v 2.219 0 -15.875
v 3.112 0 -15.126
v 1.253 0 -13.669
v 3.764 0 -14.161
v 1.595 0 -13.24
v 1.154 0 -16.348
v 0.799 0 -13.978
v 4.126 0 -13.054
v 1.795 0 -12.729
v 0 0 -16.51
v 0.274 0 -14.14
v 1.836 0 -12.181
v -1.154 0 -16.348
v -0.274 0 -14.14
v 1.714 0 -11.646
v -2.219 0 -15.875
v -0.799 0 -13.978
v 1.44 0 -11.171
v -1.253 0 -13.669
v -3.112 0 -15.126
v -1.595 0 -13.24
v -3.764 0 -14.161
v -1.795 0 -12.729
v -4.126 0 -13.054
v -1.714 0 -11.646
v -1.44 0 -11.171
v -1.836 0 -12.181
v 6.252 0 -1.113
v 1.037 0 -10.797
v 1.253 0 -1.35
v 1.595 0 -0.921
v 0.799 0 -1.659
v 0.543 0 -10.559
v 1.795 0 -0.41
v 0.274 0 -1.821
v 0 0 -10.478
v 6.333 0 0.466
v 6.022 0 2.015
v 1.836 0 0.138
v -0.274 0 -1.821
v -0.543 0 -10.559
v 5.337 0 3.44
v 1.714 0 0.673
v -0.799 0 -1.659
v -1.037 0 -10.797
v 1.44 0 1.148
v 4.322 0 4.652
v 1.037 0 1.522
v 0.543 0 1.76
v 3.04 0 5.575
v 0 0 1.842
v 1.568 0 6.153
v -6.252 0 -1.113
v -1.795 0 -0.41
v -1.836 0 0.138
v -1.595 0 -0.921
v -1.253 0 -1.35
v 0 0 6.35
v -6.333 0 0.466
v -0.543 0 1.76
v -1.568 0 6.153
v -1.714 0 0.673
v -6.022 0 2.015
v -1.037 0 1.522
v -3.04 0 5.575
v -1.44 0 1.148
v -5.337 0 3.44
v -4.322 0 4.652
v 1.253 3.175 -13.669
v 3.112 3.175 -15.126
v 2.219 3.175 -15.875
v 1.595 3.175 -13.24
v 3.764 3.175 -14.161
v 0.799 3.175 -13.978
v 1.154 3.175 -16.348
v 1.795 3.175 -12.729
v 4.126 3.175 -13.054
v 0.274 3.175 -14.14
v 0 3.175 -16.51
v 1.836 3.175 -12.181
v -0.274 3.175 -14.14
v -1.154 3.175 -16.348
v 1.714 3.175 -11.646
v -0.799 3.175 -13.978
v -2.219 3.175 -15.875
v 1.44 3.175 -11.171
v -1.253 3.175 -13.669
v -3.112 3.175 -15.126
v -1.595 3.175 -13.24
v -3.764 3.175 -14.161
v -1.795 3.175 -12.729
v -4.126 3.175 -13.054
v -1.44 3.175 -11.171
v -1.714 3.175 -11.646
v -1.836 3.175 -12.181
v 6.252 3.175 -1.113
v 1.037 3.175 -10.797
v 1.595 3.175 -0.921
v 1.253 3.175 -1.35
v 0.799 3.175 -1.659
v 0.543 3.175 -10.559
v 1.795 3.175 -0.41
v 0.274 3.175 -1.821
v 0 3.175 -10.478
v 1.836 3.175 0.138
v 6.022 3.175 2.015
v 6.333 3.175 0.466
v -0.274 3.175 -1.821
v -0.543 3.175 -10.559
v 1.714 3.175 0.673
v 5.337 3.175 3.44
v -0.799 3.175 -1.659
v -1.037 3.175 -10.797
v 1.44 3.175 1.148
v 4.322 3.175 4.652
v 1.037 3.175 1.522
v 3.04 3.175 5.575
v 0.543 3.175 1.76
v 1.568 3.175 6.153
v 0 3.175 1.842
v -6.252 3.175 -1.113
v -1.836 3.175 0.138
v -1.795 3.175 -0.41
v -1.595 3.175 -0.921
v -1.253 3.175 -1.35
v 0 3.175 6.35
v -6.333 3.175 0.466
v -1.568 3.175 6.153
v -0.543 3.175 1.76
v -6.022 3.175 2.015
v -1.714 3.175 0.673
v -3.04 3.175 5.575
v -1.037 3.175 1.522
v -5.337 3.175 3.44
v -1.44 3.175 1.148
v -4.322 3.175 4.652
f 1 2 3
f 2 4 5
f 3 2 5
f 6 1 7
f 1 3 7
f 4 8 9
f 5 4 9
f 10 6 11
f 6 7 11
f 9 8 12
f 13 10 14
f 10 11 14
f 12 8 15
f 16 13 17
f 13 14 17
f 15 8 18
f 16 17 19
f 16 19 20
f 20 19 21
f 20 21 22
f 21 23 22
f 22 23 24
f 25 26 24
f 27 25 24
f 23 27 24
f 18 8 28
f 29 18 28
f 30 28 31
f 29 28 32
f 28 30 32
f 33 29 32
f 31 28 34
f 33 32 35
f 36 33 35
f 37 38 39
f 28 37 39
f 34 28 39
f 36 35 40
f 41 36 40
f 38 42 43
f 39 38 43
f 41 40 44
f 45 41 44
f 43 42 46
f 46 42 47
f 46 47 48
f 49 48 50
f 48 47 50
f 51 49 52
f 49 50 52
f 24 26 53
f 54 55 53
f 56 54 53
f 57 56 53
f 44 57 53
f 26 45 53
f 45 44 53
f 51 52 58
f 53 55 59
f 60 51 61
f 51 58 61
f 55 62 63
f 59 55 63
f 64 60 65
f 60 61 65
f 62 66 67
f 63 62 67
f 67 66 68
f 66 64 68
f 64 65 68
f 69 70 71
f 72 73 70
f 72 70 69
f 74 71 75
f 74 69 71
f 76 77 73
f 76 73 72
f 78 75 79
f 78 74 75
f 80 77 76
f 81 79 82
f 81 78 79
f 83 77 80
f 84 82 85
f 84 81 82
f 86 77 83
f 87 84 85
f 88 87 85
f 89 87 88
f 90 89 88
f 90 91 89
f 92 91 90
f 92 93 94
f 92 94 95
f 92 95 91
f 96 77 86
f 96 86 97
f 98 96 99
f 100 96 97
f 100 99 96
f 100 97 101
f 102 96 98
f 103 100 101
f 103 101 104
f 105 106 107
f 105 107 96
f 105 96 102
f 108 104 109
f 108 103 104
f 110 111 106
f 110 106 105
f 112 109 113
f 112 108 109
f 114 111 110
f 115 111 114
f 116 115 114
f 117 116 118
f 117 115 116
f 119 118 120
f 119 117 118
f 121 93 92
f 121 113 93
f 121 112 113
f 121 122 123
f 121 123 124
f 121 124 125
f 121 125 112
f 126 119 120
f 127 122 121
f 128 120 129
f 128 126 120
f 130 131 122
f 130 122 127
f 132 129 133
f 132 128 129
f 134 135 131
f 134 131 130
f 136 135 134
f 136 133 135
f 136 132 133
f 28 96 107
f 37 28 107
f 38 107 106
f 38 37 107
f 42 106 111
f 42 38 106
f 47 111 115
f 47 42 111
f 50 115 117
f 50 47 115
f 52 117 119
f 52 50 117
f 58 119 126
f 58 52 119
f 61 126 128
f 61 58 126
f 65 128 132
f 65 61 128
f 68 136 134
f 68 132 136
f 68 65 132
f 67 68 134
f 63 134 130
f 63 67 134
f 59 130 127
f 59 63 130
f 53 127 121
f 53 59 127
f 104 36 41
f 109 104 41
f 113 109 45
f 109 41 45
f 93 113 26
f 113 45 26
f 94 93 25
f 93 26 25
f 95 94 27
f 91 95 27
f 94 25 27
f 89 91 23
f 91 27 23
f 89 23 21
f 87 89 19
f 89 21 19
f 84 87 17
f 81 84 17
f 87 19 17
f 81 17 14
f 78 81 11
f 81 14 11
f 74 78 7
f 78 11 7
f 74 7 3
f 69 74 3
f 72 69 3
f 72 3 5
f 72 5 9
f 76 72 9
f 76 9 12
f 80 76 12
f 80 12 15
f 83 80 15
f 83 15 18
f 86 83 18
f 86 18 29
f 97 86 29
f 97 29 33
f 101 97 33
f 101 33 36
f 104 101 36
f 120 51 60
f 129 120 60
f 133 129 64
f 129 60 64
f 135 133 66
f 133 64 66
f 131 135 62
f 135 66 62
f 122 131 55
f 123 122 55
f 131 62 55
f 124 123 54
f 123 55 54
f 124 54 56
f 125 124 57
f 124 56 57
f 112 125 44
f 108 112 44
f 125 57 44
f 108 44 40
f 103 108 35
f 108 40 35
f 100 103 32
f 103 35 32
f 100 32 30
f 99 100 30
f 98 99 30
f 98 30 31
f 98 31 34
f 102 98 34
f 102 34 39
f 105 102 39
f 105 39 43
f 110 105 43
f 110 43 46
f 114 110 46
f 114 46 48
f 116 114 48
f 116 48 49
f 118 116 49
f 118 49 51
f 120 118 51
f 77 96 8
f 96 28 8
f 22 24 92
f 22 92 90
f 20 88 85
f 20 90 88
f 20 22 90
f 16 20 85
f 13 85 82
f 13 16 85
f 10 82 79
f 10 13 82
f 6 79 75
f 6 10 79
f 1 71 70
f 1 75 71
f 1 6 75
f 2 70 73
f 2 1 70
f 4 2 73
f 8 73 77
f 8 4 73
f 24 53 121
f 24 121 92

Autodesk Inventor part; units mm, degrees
ref_plane "YZ Plane" through (0, 0, 0) normal (1, 0, 0) x (0, 1, 0)
ref_plane "XZ Plane" through (0, 0, 0) normal (0, 1, 0) x (-1, 0, 0)
ref_plane "XY Plane" through (0, 0, 0) normal (0, 0, 1) x (1, 0, 0)
sketch "Sketch1" plane through (0, 0, 0) normal (0, 1, 0) x (-1, 0, 0)
  arc A0 (6.2517, -1.1129) -> (-6.2517, -1.1129) centre (0, 0) ccw
  arc A1 (-4.1261, -13.0535) -> (4.1261, -13.0535) centre (0, -12.319) ccw
  line L0 (6.2517, -1.1129) -> (4.1261, -13.0535)
  line L1 (-6.2517, -1.1129) -> (-4.1261, -13.0535)
  dimension "d0" = 22.86
  dimension "d1" = 12.7
  dimension "d2" = 8.382
extrude "Extrusion1" add sketch "Sketch1" along normal blind 3.175
sketch "Sketch2" plane through (0, 3.175, 0) normal (0, 1, 0) x (1, 0, 0)
  arc A0 (-6.2517, 1.1129) -> (6.2517, 1.1129) centre (0, 0) ccw projected
  arc A1 (4.1261, 13.0535) -> (-4.1261, 13.0535) centre (0, 12.319) ccw projected
hole "Hole1" at (0, 3.175, 0) at (0, 3.175, -12.319) direction (0, -1, 0) diameter 3.683 end through all
properties part number "GripperServoHorn"
